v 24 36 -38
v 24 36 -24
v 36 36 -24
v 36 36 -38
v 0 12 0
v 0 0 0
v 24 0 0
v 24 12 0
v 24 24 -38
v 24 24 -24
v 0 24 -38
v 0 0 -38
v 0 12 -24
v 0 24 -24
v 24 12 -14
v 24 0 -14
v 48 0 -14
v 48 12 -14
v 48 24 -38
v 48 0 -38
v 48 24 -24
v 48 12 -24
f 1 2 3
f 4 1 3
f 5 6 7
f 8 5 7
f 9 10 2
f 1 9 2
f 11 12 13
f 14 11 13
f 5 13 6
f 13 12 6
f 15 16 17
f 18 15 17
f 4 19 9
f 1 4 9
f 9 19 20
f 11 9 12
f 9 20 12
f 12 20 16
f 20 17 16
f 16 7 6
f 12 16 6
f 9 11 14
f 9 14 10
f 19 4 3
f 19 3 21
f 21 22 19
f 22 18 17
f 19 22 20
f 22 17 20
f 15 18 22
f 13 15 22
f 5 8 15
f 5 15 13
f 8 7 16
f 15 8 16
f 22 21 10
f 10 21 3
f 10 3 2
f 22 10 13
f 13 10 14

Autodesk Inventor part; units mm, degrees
ref_plane "YZ Plane" through (0, 0, 0) normal (1, 0, 0) x (0, 1, 0)
ref_plane "XZ Plane" through (0, 0, 0) normal (0, 1, 0) x (-1, 0, 0)
ref_plane "XY Plane" through (0, 0, 0) normal (0, 0, 1) x (1, 0, 0)
sketch "草圖1" plane through (0, 0, 0) normal (0, 1, 0) x (-1, 0, 0)
  line L0 (0, 0) -> (-24, 0)
  line L1 (-24, 0) -> (-24, -14)
  line L2 (-24, -14) -> (-48, -14)
  line L3 (-48, -14) -> (-48, -38)
  line L4 (-48, -38) -> (0, -38)
  line L5 (0, -38) -> (0, 0)
  dimension "d0" = 24
  dimension "d1" = 14
  dimension "d2" = 38
  dimension "d3" = 48
extrude "擠出1" add sketch "草圖1" along normal blind 12
sketch "草圖2" plane through (48, 0, -38) normal (0, 0, -1) x (-1, 0, 0)
  line L0 (48, 12) -> (24, 12) projected
  line L1 (48, 12) -> (48, 24)
  line L2 (48, 24) -> (24, 24)
  line L3 (24, 24) -> (24, 36)
  line L4 (24, 36) -> (12, 36)
  line L5 (12, 36) -> (0, 24)
  line L6 (24, 12) -> (0, 12) projected
  line L7 (0, 24) -> (0, 12)
  line L8 (0, 12) -> (48, 12)
  point P0 (48, 0)
  dimension "d6" = 12
  dimension "d7" = 24
  dimension "d8" = 12
  dimension "d9" = 12
extrude "擠出2" add sketch "草圖2" against normal blind 14
properties part number "410571040練習一"
